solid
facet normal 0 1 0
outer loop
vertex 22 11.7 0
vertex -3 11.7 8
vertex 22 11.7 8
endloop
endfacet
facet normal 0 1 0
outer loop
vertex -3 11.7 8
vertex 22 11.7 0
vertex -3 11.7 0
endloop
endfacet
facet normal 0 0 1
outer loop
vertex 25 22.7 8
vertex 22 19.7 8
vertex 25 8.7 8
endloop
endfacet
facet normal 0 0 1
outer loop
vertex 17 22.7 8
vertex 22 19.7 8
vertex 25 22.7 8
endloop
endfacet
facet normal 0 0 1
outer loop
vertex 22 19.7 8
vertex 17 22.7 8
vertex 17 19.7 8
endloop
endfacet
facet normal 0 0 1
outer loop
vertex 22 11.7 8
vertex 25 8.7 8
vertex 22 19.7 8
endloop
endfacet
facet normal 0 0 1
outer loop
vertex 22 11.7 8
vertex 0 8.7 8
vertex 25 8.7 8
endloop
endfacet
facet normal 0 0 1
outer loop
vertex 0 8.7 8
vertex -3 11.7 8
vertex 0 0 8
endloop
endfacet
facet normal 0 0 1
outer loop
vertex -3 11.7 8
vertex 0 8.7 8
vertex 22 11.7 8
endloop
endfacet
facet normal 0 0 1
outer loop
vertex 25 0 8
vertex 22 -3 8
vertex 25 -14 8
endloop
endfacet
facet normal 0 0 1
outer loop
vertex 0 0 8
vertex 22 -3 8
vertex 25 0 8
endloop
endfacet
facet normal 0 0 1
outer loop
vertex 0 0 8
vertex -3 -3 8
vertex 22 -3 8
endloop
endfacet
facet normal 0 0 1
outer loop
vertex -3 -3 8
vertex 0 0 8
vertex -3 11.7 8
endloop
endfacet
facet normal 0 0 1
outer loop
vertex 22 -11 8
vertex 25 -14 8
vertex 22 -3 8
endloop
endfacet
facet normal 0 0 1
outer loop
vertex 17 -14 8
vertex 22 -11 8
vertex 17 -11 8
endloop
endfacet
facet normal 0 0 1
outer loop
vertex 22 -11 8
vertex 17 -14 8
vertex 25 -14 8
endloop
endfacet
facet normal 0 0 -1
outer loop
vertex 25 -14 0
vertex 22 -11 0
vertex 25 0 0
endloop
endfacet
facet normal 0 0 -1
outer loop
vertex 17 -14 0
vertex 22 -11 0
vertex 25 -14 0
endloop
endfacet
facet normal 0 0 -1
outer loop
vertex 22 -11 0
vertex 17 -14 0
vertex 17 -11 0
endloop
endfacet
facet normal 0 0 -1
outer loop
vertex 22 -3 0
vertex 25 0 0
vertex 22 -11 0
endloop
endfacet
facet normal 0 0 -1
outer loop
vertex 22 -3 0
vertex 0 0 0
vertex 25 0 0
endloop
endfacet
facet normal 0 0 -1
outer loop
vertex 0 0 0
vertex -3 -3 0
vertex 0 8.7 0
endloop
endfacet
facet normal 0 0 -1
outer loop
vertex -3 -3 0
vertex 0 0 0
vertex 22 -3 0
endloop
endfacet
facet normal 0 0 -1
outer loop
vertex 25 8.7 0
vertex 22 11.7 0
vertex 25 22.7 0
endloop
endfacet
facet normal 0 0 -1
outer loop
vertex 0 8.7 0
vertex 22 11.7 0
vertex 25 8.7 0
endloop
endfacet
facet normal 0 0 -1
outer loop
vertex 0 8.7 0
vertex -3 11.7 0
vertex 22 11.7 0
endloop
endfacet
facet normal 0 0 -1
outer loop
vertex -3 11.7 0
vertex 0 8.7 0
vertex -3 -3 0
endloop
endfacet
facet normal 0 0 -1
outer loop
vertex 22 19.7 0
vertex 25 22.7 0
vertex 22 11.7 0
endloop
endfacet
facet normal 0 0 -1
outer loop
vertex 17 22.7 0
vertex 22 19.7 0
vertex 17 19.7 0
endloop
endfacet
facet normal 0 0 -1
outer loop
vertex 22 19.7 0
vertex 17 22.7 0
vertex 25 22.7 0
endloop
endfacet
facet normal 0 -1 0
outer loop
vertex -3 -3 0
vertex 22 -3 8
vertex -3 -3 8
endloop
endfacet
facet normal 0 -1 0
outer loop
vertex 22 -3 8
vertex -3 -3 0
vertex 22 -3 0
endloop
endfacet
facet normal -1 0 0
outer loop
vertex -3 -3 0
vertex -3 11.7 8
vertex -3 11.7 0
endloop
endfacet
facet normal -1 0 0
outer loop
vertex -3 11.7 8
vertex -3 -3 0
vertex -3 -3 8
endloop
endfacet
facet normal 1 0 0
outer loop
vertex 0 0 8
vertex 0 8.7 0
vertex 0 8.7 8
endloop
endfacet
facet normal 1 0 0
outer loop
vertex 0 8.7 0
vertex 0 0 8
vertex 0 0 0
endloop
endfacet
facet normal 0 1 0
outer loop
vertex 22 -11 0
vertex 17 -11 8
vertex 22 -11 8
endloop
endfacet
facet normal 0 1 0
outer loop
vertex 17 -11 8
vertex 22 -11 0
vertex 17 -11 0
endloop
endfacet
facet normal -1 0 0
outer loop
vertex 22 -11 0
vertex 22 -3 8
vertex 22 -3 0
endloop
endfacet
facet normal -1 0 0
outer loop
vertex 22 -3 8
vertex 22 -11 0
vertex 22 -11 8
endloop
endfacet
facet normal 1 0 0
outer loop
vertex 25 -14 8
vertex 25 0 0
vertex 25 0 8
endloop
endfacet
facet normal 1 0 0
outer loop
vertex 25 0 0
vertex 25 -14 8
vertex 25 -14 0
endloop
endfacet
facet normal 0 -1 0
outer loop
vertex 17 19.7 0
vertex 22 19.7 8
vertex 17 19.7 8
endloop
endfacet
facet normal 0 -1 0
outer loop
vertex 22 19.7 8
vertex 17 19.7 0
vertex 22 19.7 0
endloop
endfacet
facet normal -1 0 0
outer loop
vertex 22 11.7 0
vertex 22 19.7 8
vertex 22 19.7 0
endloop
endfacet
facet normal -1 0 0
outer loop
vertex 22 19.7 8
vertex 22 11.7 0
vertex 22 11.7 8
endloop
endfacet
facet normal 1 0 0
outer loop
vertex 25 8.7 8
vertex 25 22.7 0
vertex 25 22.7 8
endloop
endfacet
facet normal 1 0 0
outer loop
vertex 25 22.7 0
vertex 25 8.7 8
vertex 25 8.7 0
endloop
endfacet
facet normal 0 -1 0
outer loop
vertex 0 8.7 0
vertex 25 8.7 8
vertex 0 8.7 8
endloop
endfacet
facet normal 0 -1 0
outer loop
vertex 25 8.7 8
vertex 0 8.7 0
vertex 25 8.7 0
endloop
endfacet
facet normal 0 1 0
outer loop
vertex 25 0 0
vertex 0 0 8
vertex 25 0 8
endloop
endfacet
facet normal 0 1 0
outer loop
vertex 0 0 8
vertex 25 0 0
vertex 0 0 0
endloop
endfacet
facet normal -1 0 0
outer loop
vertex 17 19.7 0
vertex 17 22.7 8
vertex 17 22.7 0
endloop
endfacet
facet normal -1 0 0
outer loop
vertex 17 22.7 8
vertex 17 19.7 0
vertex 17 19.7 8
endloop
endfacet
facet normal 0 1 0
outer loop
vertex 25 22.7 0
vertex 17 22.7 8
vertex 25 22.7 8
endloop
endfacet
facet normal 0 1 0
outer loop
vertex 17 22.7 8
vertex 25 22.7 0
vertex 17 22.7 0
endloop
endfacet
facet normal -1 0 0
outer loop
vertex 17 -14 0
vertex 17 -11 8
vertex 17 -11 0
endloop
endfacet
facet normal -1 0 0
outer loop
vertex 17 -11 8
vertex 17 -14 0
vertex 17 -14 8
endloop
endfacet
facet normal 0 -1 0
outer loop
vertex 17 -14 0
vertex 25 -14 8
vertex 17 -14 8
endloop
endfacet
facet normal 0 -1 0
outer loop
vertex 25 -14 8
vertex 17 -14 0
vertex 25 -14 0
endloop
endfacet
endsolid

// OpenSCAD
structure_thickness = 3;
width = 8;
wall = 8.7;

length = 25;
hook_size = 8;


//right towards the wall
translate([0, wall, 0])
cube([length, structure_thickness, width]);


//left towards the wall
translate([0, -structure_thickness, 0])
cube([length, structure_thickness, width]);

//rigth hook
translate([length - hook_size, wall + hook_size + structure_thickness, 0])
cube([hook_size, structure_thickness, width]);

//left hook
translate([length - hook_size, -(structure_thickness*2 + hook_size), 0])
cube([hook_size, structure_thickness, width]);


//flats
rotate([0, 0, 90])
union() {
    
    //top
    translate([-structure_thickness, 0, 0])
    cube([wall + structure_thickness*2, structure_thickness, width]);

    //left
    translate([-structure_thickness - hook_size, -length, 0])
    cube([hook_size, structure_thickness, width]);
    
    //right
    translate([wall+structure_thickness, -length, 0])
    cube([hook_size, structure_thickness, width]);
}
